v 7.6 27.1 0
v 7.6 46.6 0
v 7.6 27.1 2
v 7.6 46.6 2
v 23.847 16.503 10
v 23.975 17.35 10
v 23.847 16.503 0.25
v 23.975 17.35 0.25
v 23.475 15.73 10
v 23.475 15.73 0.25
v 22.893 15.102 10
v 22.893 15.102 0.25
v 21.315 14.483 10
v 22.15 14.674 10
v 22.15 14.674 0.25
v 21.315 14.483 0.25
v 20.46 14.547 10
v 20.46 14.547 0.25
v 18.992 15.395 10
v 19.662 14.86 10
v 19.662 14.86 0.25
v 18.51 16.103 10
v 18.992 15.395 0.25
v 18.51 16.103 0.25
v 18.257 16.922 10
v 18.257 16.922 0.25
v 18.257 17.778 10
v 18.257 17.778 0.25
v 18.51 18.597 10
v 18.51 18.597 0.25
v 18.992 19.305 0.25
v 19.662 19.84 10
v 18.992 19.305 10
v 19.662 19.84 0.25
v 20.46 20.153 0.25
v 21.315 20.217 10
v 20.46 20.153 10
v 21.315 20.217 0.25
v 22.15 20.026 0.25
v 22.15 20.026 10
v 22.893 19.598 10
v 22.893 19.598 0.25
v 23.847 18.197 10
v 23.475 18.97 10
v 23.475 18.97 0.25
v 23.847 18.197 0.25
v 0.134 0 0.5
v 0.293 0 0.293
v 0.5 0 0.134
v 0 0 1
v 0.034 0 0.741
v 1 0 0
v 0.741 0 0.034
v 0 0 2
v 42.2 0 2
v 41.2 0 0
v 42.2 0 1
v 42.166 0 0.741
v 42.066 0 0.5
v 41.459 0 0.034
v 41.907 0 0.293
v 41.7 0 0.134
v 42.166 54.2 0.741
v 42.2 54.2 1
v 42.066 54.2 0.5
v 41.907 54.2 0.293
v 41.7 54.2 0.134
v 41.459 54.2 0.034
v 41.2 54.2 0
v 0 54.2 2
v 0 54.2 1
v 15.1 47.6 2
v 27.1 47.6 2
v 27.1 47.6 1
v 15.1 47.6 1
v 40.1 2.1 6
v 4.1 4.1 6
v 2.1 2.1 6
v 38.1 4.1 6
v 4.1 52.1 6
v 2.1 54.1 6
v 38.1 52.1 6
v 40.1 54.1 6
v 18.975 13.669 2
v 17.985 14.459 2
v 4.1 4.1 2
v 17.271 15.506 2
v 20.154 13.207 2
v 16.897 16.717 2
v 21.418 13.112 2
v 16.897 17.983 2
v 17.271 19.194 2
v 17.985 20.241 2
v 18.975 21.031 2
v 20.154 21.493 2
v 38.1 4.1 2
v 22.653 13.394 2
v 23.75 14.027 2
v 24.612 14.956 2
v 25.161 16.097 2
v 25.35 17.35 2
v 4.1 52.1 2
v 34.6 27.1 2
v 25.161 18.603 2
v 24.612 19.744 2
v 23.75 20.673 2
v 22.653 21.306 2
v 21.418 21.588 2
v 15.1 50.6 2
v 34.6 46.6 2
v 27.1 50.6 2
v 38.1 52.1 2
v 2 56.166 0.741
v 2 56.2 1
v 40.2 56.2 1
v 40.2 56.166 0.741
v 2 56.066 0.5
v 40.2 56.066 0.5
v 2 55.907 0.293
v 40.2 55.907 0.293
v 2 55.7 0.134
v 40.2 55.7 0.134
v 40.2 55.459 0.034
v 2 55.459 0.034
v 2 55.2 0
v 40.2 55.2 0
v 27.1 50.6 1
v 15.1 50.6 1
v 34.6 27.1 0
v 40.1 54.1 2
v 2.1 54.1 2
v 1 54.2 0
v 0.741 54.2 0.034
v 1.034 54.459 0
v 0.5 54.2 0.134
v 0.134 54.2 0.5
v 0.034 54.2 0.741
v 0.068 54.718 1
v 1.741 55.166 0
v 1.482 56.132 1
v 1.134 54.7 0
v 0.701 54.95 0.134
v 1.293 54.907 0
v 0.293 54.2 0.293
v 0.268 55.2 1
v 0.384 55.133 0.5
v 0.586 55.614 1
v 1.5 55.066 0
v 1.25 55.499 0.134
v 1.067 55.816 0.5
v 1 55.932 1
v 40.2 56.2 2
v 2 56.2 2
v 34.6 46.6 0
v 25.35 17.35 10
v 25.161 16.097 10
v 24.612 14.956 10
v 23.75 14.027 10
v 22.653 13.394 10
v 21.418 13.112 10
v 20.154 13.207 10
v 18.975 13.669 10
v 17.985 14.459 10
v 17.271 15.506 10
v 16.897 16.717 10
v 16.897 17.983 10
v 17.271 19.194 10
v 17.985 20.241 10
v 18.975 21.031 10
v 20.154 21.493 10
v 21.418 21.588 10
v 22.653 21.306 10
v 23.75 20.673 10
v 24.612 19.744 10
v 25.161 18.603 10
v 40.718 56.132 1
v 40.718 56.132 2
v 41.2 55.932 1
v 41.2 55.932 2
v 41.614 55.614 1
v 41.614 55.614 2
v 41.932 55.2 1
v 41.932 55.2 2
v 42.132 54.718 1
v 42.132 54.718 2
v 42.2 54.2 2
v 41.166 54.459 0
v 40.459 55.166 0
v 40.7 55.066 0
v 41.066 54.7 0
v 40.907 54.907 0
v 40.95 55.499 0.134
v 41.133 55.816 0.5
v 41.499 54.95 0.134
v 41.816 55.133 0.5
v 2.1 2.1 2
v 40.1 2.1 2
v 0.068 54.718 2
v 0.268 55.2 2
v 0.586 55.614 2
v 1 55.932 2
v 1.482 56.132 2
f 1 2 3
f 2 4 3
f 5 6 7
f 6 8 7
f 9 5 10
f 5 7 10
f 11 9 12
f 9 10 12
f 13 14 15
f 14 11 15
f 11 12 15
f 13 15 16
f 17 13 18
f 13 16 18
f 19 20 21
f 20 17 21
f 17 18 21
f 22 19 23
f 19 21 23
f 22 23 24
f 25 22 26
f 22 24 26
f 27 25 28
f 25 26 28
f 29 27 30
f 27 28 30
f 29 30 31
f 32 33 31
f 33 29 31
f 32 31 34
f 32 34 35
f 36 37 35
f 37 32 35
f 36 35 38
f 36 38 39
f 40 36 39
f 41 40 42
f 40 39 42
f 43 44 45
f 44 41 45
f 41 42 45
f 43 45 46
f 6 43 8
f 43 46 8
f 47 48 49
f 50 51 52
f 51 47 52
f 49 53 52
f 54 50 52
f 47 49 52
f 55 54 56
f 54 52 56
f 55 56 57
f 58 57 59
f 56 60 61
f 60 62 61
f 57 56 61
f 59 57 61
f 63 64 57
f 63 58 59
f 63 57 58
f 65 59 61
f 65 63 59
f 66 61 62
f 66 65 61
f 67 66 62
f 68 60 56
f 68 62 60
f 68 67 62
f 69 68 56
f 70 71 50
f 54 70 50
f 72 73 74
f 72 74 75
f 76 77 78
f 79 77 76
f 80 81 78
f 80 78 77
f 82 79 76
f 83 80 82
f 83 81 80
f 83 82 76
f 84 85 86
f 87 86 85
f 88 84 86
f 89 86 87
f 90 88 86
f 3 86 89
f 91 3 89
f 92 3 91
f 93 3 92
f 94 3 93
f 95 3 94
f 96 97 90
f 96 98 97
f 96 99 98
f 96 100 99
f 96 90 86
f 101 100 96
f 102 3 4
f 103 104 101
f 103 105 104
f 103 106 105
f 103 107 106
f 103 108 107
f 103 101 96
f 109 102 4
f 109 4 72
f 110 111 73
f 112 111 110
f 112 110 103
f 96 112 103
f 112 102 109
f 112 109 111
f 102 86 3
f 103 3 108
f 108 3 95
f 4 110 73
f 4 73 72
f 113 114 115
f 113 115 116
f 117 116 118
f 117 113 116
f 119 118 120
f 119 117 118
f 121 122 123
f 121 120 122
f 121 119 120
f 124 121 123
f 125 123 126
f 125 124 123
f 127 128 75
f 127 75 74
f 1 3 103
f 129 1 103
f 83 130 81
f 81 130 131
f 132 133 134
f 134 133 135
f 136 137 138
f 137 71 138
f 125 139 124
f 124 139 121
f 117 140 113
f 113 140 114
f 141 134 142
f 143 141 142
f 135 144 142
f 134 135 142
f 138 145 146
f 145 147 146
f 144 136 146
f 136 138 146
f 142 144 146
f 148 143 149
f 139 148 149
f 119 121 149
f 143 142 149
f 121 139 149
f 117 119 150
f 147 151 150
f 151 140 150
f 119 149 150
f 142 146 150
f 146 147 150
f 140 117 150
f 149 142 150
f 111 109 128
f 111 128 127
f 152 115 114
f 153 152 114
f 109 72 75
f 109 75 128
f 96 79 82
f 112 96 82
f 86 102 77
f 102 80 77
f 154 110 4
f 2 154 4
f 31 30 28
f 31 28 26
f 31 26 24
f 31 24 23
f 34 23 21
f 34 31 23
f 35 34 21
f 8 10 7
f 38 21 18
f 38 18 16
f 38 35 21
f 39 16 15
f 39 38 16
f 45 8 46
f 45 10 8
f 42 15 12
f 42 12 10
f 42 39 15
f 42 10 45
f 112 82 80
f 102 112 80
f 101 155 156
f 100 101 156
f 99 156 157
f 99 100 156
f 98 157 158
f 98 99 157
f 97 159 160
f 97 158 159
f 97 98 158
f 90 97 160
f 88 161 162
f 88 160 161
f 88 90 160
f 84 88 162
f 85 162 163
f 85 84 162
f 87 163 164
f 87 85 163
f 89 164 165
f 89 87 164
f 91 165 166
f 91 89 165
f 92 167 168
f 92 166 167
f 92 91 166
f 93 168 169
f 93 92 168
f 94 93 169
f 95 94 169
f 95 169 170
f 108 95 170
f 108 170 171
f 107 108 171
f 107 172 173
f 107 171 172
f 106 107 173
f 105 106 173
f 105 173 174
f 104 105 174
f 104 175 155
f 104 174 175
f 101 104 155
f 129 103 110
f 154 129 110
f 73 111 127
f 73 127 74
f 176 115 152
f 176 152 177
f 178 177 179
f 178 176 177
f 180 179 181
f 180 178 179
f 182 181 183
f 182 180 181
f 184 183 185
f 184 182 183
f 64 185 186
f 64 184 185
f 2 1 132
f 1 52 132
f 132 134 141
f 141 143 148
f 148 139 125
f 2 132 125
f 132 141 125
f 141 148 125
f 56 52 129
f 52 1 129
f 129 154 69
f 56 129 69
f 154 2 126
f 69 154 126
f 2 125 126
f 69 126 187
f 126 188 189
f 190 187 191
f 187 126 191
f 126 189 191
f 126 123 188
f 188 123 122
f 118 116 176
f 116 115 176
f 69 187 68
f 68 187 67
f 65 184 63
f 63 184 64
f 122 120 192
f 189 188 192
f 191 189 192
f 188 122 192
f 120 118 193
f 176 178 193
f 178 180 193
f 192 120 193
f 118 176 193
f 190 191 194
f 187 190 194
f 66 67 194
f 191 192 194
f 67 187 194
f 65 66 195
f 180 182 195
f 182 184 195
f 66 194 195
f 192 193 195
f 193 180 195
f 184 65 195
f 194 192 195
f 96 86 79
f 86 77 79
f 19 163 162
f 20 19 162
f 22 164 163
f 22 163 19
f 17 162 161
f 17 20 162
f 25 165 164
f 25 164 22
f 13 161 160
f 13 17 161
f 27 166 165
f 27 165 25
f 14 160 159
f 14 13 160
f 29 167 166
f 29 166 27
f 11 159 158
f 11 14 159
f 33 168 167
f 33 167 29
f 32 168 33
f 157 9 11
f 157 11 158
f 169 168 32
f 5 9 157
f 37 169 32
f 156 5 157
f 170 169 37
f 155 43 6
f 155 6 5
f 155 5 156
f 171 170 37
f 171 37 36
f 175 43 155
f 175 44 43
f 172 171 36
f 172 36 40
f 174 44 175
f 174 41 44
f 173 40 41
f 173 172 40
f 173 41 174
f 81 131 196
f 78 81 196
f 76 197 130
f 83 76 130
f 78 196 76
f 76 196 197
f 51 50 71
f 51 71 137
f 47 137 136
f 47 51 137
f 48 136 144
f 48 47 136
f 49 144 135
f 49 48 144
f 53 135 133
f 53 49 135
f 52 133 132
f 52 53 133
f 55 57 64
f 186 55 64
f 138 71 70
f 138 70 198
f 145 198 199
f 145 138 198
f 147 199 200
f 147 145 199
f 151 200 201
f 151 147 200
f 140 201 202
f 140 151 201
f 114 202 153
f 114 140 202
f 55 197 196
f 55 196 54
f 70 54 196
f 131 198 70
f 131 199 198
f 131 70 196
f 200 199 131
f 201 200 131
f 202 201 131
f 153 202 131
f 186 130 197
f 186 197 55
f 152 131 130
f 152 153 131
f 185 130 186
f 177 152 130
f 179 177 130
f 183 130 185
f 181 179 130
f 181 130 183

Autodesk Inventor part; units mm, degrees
ref_plane "YZ Plane" through (0, 0, 0) normal (1, 0, 0) x (0, 1, 0)
ref_plane "XZ Plane" through (0, 0, 0) normal (0, 1, 0) x (-1, 0, 0)
ref_plane "XY Plane" through (0, 0, 0) normal (0, 0, 1) x (1, 0, 0)
sketch "Sketch2" plane through (0, 0, 0) normal (0, 0, 1) x (1, 0, 0)
  line L0 (0, 0) -> (42.2, 0)
  line L1 (42.2, 0) -> (42.2, 56.2)
  line L2 (42.2, 56.2) -> (0, 56.2)
  line L3 (0, 56.2) -> (0, 0)
  dimension "d0" = 42.2
  dimension "d1" = 56.2
extrude "Extrusion1" add sketch "Sketch2" along normal blind 2
sketch "Sketch4" plane through (0, 0, 2) normal (0, 0, 1) x (1, 0, 0)
  line L0 (2.1, 2.1) -> (40.1, 2.1)
  line L1 (40.1, 2.1) -> (40.1, 54.1)
  line L2 (40.1, 54.1) -> (2.1, 54.1)
  line L3 (2.1, 54.1) -> (2.1, 2.1)
  line L4 (42.2, 0) -> (42.2, 56.2) projected
  line L5 (0, 56.2) -> (0, 0) projected
  line L6 (0, 0) -> (42.2, 0) projected
  line L7 (42.2, 56.2) -> (0, 56.2) projected
  dimension "d12" = 38
  dimension "d13" = 52
  dimension "d49" = 42.2
  dimension "d50" = 56.2
  dimension "d51" = 2.1
  dimension "d52" = 2.1
extrude "Extrusion2" add sketch "Sketch4" along normal blind 4 contours L3 L2 L1 L0
sketch "Sketch5" plane through (0, 0, 6) normal (0, 0, 1) x (1, 0, 0)
  line L0 (4.1, 4.1) -> (38.1, 4.1)
  line L1 (38.1, 4.1) -> (38.1, 52.1)
  line L2 (38.1, 52.1) -> (4.1, 52.1)
  line L3 (4.1, 52.1) -> (4.1, 4.1)
  line L4 (40.1, 2.1) -> (40.1, 54.1) projected
  line L5 (2.1, 54.1) -> (2.1, 2.1) projected
  line L6 (2.1, 2.1) -> (40.1, 2.1) projected
  line L7 (40.1, 54.1) -> (2.1, 54.1) projected
  point P0 (0, 0)
  dimension "d16" = 34
  dimension "d17" = 48
  dimension "d45" = 38
  dimension "d46" = 2
  dimension "d47" = 52
  dimension "d48" = 2
extrude "Extrusion3" cut sketch "Sketch5" against normal blind 4 contours L3 L2 L1 L0
sketch "Sketch6" plane through (0, 0, 2) normal (0, 0, 1) x (1, 0, 0)
  line L0 (7.6, 27.1) -> (34.6, 27.1)
  line L1 (34.6, 27.1) -> (34.6, 46.6)
  line L2 (34.6, 46.6) -> (7.6, 46.6)
  line L3 (7.6, 46.6) -> (7.6, 27.1)
  line L4 (15.1, 50.6) -> (27.1, 50.6)
  line L5 (27.1, 50.6) -> (27.1, 47.6)
  line L6 (27.1, 47.6) -> (15.1, 47.6)
  line L7 (15.1, 47.6) -> (15.1, 50.6)
  line L8 (4.1, 52.1) -> (38.1, 52.1) projected
  line L9 (38.1, 52.1) -> (38.1, 4.1) projected
  line L10 (4.1, 4.1) -> (4.1, 52.1) projected
  point P0 (0, 0)
  dimension "d20" = 27
  dimension "d21" = 19.5
  dimension "d22" = 12
  dimension "d23" = 3
  dimension "d24" = 1
  dimension "d25" = 1.5
  dimension "d42" = 34
  dimension "d43" = 3.5
  dimension "d44" = 11
extrude "Extrusion4" cut sketch "Sketch6" against normal blind 1 contours L4 L5 L6 L7
extrude "Extrusion5" cut sketch "Sketch6" against normal blind 2 contours L3 L2 L1 L0
sketch "Sketch7" plane through (0, 0, 2) normal (0, 0, 1) x (1, 0, 0)
  circle A0 centre (21.1, 17.35) radius 2.875
  circle A1 centre (21.1, 17.35) radius 4.25
  line L0 (38.1, 4.1) -> (4.1, 4.1) projected
  line L1 (34.6, 27.1) -> (7.6, 27.1) projected
  line L2 (38.1, 52.1) -> (38.1, 4.1) projected
  line L3 (4.1, 4.1) -> (4.1, 52.1) projected
  point P0 (0, 0)
  dimension "d30" = 5.75
  dimension "d31" = 8.5
  dimension "d32" = 9
  dimension "d37" = 5.5
  dimension "d39" = 34
  dimension "d40" = 17
extrude "Extrusion6" add sketch "Sketch7" along normal blind 8
extrude "Extrusion7" cut sketch "Sketch7" against normal blind 1.75 contours A0
fillet "Fillet2" radius 1 3 edges at (21.1, 56.2, 0) (42.2, 28.1, 0) (0, 28.1, 0)
fillet "Fillet3" radius 2 4 edges at (0, 56.2, 1.5) (0.2929, 55.9071, 0.2929) (42.2, 56.2, 1.5) (41.9071, 55.9071, 0.2929)
equation "\"d51\" = -0.5 * d12 + 0.5 * d49"
equation "\"d52\" = -0.5 * d13 + 0.5 * d50"
equation "\"d46\" = -0.5 * d16 + 0.5 * d45"
equation "\"d48\" = -0.5 * d17 + 0.5 * d47"
equation "\"d43\" = -0.5 * d20 + 0.5 * d42"
equation "\"d44\" = -0.5 * d22 + 0.5 * d42"
equation "\"d40\" = 0.5 * d39"
properties part number "Enclosure v2" material "PLA Plastic"
